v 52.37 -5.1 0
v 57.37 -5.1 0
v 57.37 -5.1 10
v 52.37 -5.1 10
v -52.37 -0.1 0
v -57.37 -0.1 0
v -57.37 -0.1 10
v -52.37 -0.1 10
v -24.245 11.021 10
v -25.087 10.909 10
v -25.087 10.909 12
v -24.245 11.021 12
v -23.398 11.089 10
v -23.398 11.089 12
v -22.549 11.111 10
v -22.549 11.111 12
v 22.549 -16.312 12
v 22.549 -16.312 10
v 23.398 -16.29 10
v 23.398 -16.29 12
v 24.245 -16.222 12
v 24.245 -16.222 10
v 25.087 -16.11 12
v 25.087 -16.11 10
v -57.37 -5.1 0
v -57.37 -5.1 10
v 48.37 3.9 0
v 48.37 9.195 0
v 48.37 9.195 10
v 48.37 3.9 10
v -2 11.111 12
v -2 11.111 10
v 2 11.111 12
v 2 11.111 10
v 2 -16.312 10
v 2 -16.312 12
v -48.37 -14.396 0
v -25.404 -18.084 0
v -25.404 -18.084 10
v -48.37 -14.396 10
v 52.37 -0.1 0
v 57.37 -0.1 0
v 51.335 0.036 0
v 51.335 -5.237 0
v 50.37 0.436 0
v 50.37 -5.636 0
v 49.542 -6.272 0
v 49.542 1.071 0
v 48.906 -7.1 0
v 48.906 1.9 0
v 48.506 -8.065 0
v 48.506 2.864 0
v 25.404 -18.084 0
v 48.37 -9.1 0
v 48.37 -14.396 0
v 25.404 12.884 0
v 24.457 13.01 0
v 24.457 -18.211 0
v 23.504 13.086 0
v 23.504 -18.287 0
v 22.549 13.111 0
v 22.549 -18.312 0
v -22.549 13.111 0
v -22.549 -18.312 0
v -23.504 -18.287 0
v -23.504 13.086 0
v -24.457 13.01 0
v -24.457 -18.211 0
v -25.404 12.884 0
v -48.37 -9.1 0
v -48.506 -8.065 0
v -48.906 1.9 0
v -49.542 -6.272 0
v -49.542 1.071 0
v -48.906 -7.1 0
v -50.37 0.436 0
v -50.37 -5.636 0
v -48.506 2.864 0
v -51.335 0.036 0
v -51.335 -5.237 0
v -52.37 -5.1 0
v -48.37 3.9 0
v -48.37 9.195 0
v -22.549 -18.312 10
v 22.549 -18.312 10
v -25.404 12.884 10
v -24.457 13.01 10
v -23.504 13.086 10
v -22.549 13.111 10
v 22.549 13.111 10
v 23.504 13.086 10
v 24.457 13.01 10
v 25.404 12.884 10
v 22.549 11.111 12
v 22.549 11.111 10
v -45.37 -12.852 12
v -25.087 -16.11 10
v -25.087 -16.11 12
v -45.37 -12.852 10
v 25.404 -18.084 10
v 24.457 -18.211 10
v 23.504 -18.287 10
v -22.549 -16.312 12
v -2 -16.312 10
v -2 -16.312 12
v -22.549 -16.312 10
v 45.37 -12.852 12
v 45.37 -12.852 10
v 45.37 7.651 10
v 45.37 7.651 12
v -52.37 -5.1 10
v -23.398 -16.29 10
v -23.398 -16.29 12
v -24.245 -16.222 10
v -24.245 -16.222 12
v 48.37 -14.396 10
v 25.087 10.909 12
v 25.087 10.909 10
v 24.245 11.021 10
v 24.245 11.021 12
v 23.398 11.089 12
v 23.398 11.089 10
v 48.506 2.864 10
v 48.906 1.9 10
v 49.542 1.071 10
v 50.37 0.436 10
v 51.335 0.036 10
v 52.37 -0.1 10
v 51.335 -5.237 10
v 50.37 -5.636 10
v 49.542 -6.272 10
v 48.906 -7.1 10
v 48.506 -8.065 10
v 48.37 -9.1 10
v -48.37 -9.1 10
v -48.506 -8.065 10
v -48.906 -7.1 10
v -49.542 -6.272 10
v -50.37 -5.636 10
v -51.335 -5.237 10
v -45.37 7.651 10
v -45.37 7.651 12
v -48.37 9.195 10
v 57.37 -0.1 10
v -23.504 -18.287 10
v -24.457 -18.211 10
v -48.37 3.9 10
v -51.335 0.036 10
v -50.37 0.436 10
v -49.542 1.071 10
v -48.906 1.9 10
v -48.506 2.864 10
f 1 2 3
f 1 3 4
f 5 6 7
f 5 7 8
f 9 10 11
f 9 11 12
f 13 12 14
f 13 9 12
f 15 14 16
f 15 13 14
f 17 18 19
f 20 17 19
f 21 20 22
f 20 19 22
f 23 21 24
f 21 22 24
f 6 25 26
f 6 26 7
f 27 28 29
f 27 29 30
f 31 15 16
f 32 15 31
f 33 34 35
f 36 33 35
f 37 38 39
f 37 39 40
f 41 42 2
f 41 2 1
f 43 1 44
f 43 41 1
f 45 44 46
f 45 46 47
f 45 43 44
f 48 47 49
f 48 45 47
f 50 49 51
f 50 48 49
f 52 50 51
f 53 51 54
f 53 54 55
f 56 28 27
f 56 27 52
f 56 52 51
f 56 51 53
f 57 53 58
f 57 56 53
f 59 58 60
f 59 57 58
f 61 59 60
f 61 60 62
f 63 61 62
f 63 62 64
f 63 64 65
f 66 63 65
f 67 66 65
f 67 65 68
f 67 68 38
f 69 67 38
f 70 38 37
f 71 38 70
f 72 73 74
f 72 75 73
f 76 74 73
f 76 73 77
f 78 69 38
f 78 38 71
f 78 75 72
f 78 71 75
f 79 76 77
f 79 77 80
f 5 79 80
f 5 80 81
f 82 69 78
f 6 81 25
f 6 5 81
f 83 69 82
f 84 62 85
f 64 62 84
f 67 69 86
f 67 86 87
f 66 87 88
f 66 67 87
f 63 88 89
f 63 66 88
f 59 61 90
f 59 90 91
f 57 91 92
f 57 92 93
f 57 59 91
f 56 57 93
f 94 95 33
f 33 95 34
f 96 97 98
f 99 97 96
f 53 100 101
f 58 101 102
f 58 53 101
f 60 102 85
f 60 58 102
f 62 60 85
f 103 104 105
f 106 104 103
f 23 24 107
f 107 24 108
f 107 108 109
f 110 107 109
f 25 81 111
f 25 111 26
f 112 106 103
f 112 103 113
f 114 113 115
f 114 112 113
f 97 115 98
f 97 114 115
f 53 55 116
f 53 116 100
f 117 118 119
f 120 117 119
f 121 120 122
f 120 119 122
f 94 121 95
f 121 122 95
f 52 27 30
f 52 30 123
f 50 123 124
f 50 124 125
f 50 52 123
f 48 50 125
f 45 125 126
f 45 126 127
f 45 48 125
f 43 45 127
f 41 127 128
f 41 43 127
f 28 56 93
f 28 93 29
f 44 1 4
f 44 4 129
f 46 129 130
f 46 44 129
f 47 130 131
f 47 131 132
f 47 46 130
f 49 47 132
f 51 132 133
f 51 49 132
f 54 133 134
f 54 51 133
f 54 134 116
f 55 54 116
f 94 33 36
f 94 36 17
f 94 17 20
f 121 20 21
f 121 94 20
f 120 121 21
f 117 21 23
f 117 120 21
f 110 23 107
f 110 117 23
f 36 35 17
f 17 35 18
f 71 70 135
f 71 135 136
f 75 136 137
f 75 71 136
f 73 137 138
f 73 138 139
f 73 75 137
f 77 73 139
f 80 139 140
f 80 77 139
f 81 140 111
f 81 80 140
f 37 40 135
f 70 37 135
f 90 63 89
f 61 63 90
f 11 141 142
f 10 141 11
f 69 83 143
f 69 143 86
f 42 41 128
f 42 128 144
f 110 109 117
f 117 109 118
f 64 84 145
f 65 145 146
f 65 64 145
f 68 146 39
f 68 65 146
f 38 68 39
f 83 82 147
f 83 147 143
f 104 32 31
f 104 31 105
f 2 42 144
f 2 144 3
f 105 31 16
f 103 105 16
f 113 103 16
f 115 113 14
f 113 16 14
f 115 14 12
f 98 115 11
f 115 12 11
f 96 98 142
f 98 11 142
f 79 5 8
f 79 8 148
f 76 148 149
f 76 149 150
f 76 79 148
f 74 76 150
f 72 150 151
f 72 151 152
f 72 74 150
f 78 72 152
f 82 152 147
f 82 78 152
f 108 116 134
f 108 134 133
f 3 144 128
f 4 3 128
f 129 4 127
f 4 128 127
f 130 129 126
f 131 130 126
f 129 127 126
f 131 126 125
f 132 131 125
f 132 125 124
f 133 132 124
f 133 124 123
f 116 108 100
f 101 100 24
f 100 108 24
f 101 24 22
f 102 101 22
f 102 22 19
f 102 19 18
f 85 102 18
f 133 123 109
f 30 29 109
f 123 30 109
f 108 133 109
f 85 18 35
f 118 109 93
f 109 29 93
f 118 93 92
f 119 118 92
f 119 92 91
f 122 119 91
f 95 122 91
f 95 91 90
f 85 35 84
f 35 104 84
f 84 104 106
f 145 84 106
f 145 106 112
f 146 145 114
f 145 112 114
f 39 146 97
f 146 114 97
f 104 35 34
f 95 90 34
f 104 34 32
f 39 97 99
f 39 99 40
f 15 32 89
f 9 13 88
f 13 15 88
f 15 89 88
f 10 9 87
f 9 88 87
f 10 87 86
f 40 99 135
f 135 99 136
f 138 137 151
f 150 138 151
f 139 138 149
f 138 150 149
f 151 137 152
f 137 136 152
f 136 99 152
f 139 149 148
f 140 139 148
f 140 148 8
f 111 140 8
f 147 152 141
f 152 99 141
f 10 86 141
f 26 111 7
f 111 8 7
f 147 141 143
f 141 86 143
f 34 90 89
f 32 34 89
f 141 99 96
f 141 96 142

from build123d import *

# Parameters (mm, degrees)
BOSS_EXTRUDE1_DEPTH = 10
BOSS_EXTRUDE2_DEPTH = 2


with BuildPart() as part:
    # Sketch1 → Boss-Extrude1 (new body)
    with BuildSketch(Plane.XY):
        with BuildLine():
            Line((-52.370168415, -5.10038319), (-57.370168415, -5.10038319))
            Line((-57.370168415, -5.10038319), (-57.370168415, -0.10038319))
            Line((-57.370168415, -0.10038319), (-52.370168415, -0.10038319))
            ThreePointArc((-52.370168415, -0.10038319), (-49.54174129, 1.071189685), (-48.370168415, 3.89961681))
            Line((-48.370168415, 3.89961681), (-48.370168415, 9.195191959))
            Line((-48.370168415, 9.195191959), (-25.403732634, 12.883646701))
            ThreePointArc((-25.403732634, 12.883646701), (-23.981138375, 13.054361886), (-22.549472845, 13.111387389))
            Line((-22.549472845, 13.111387389), (22.549472845, 13.111387389))
            ThreePointArc((22.549472845, 13.111387389), (23.981138375, 13.054361886), (25.403732634, 12.883646701))
            Line((25.403732634, 12.883646701), (48.370168415, 9.195191959))
            Line((48.370168415, 9.195191959), (48.370168415, 3.89961681))
            ThreePointArc((48.370168415, 3.89961681), (49.54174129, 1.071189685), (52.370168415, -0.10038319))
            Line((52.370168415, -0.10038319), (57.370168415, -0.10038319))
            Line((57.370168415, -0.10038319), (57.370168415, -5.10038319))
            Line((57.370168415, -5.10038319), (52.370168415, -5.10038319))
            ThreePointArc((52.370168415, -5.10038319), (49.54174129, -6.271956065), (48.370168415, -9.10038319))
            Line((48.370168415, -9.10038319), (48.370168415, -14.395958339))
            Line((48.370168415, -14.395958339), (25.403732634, -18.084413081))
            ThreePointArc((25.403732634, -18.084413081), (23.981138375, -18.255128266), (22.549472845, -18.312153769))
            Line((22.549472845, -18.312153769), (-22.549472845, -18.312153769))
            ThreePointArc((-22.549472845, -18.312153769), (-23.981138375, -18.255128266), (-25.403732634, -18.084413081))
            Line((-25.403732634, -18.084413081), (-48.370168415, -14.395958339))
            Line((-48.370168415, -14.395958339), (-48.370168415, -9.10038319))
            ThreePointArc((-48.370168415, -9.10038319), (-49.54174129, -6.271956065), (-52.370168415, -5.10038319))
        make_face()
    extrude(amount=BOSS_EXTRUDE1_DEPTH)

    # Sketch2 → Boss-Extrude2 (add)
    with BuildSketch(Plane.XY.offset(10)):
        with BuildLine():
            Line((-2, 11.111387389), (-2, -16.312153769))
            Line((-2, -16.312153769), (-22.549472845, -16.312153769))
            ThreePointArc((-22.549472845, -16.312153769), (-23.822064428, -16.261464433), (-25.086592657, -16.109717602))
            Line((-25.086592657, -16.109717602), (-45.370168415, -12.852135455))
            Line((-45.370168415, -12.852135455), (-45.370168415, 7.651369075))
            Line((-45.370168415, 7.651369075), (-25.086592657, 10.908951222))
            ThreePointArc((-25.086592657, 10.908951222), (-23.822064428, 11.060698053), (-22.549472845, 11.111387389))
            Line((-22.549472845, 11.111387389), (-2, 11.111387389))
        make_face()
        with BuildLine():
            Line((2, 11.111387389), (2, -16.312153769))
            Line((2, -16.312153769), (22.549472845, -16.312153769))
            ThreePointArc((22.549472845, -16.312153769), (23.822064428, -16.261464433), (25.086592657, -16.109717602))
            Line((25.086592657, -16.109717602), (45.370168415, -12.852135455))
            Line((45.370168415, -12.852135455), (45.370168415, 7.651369075))
            Line((45.370168415, 7.651369075), (25.086592657, 10.908951222))
            ThreePointArc((25.086592657, 10.908951222), (23.822064428, 11.060698053), (22.549472845, 11.111387389))
            Line((22.549472845, 11.111387389), (2, 11.111387389))
        make_face()
    extrude(amount=BOSS_EXTRUDE2_DEPTH)


solid = part.part
